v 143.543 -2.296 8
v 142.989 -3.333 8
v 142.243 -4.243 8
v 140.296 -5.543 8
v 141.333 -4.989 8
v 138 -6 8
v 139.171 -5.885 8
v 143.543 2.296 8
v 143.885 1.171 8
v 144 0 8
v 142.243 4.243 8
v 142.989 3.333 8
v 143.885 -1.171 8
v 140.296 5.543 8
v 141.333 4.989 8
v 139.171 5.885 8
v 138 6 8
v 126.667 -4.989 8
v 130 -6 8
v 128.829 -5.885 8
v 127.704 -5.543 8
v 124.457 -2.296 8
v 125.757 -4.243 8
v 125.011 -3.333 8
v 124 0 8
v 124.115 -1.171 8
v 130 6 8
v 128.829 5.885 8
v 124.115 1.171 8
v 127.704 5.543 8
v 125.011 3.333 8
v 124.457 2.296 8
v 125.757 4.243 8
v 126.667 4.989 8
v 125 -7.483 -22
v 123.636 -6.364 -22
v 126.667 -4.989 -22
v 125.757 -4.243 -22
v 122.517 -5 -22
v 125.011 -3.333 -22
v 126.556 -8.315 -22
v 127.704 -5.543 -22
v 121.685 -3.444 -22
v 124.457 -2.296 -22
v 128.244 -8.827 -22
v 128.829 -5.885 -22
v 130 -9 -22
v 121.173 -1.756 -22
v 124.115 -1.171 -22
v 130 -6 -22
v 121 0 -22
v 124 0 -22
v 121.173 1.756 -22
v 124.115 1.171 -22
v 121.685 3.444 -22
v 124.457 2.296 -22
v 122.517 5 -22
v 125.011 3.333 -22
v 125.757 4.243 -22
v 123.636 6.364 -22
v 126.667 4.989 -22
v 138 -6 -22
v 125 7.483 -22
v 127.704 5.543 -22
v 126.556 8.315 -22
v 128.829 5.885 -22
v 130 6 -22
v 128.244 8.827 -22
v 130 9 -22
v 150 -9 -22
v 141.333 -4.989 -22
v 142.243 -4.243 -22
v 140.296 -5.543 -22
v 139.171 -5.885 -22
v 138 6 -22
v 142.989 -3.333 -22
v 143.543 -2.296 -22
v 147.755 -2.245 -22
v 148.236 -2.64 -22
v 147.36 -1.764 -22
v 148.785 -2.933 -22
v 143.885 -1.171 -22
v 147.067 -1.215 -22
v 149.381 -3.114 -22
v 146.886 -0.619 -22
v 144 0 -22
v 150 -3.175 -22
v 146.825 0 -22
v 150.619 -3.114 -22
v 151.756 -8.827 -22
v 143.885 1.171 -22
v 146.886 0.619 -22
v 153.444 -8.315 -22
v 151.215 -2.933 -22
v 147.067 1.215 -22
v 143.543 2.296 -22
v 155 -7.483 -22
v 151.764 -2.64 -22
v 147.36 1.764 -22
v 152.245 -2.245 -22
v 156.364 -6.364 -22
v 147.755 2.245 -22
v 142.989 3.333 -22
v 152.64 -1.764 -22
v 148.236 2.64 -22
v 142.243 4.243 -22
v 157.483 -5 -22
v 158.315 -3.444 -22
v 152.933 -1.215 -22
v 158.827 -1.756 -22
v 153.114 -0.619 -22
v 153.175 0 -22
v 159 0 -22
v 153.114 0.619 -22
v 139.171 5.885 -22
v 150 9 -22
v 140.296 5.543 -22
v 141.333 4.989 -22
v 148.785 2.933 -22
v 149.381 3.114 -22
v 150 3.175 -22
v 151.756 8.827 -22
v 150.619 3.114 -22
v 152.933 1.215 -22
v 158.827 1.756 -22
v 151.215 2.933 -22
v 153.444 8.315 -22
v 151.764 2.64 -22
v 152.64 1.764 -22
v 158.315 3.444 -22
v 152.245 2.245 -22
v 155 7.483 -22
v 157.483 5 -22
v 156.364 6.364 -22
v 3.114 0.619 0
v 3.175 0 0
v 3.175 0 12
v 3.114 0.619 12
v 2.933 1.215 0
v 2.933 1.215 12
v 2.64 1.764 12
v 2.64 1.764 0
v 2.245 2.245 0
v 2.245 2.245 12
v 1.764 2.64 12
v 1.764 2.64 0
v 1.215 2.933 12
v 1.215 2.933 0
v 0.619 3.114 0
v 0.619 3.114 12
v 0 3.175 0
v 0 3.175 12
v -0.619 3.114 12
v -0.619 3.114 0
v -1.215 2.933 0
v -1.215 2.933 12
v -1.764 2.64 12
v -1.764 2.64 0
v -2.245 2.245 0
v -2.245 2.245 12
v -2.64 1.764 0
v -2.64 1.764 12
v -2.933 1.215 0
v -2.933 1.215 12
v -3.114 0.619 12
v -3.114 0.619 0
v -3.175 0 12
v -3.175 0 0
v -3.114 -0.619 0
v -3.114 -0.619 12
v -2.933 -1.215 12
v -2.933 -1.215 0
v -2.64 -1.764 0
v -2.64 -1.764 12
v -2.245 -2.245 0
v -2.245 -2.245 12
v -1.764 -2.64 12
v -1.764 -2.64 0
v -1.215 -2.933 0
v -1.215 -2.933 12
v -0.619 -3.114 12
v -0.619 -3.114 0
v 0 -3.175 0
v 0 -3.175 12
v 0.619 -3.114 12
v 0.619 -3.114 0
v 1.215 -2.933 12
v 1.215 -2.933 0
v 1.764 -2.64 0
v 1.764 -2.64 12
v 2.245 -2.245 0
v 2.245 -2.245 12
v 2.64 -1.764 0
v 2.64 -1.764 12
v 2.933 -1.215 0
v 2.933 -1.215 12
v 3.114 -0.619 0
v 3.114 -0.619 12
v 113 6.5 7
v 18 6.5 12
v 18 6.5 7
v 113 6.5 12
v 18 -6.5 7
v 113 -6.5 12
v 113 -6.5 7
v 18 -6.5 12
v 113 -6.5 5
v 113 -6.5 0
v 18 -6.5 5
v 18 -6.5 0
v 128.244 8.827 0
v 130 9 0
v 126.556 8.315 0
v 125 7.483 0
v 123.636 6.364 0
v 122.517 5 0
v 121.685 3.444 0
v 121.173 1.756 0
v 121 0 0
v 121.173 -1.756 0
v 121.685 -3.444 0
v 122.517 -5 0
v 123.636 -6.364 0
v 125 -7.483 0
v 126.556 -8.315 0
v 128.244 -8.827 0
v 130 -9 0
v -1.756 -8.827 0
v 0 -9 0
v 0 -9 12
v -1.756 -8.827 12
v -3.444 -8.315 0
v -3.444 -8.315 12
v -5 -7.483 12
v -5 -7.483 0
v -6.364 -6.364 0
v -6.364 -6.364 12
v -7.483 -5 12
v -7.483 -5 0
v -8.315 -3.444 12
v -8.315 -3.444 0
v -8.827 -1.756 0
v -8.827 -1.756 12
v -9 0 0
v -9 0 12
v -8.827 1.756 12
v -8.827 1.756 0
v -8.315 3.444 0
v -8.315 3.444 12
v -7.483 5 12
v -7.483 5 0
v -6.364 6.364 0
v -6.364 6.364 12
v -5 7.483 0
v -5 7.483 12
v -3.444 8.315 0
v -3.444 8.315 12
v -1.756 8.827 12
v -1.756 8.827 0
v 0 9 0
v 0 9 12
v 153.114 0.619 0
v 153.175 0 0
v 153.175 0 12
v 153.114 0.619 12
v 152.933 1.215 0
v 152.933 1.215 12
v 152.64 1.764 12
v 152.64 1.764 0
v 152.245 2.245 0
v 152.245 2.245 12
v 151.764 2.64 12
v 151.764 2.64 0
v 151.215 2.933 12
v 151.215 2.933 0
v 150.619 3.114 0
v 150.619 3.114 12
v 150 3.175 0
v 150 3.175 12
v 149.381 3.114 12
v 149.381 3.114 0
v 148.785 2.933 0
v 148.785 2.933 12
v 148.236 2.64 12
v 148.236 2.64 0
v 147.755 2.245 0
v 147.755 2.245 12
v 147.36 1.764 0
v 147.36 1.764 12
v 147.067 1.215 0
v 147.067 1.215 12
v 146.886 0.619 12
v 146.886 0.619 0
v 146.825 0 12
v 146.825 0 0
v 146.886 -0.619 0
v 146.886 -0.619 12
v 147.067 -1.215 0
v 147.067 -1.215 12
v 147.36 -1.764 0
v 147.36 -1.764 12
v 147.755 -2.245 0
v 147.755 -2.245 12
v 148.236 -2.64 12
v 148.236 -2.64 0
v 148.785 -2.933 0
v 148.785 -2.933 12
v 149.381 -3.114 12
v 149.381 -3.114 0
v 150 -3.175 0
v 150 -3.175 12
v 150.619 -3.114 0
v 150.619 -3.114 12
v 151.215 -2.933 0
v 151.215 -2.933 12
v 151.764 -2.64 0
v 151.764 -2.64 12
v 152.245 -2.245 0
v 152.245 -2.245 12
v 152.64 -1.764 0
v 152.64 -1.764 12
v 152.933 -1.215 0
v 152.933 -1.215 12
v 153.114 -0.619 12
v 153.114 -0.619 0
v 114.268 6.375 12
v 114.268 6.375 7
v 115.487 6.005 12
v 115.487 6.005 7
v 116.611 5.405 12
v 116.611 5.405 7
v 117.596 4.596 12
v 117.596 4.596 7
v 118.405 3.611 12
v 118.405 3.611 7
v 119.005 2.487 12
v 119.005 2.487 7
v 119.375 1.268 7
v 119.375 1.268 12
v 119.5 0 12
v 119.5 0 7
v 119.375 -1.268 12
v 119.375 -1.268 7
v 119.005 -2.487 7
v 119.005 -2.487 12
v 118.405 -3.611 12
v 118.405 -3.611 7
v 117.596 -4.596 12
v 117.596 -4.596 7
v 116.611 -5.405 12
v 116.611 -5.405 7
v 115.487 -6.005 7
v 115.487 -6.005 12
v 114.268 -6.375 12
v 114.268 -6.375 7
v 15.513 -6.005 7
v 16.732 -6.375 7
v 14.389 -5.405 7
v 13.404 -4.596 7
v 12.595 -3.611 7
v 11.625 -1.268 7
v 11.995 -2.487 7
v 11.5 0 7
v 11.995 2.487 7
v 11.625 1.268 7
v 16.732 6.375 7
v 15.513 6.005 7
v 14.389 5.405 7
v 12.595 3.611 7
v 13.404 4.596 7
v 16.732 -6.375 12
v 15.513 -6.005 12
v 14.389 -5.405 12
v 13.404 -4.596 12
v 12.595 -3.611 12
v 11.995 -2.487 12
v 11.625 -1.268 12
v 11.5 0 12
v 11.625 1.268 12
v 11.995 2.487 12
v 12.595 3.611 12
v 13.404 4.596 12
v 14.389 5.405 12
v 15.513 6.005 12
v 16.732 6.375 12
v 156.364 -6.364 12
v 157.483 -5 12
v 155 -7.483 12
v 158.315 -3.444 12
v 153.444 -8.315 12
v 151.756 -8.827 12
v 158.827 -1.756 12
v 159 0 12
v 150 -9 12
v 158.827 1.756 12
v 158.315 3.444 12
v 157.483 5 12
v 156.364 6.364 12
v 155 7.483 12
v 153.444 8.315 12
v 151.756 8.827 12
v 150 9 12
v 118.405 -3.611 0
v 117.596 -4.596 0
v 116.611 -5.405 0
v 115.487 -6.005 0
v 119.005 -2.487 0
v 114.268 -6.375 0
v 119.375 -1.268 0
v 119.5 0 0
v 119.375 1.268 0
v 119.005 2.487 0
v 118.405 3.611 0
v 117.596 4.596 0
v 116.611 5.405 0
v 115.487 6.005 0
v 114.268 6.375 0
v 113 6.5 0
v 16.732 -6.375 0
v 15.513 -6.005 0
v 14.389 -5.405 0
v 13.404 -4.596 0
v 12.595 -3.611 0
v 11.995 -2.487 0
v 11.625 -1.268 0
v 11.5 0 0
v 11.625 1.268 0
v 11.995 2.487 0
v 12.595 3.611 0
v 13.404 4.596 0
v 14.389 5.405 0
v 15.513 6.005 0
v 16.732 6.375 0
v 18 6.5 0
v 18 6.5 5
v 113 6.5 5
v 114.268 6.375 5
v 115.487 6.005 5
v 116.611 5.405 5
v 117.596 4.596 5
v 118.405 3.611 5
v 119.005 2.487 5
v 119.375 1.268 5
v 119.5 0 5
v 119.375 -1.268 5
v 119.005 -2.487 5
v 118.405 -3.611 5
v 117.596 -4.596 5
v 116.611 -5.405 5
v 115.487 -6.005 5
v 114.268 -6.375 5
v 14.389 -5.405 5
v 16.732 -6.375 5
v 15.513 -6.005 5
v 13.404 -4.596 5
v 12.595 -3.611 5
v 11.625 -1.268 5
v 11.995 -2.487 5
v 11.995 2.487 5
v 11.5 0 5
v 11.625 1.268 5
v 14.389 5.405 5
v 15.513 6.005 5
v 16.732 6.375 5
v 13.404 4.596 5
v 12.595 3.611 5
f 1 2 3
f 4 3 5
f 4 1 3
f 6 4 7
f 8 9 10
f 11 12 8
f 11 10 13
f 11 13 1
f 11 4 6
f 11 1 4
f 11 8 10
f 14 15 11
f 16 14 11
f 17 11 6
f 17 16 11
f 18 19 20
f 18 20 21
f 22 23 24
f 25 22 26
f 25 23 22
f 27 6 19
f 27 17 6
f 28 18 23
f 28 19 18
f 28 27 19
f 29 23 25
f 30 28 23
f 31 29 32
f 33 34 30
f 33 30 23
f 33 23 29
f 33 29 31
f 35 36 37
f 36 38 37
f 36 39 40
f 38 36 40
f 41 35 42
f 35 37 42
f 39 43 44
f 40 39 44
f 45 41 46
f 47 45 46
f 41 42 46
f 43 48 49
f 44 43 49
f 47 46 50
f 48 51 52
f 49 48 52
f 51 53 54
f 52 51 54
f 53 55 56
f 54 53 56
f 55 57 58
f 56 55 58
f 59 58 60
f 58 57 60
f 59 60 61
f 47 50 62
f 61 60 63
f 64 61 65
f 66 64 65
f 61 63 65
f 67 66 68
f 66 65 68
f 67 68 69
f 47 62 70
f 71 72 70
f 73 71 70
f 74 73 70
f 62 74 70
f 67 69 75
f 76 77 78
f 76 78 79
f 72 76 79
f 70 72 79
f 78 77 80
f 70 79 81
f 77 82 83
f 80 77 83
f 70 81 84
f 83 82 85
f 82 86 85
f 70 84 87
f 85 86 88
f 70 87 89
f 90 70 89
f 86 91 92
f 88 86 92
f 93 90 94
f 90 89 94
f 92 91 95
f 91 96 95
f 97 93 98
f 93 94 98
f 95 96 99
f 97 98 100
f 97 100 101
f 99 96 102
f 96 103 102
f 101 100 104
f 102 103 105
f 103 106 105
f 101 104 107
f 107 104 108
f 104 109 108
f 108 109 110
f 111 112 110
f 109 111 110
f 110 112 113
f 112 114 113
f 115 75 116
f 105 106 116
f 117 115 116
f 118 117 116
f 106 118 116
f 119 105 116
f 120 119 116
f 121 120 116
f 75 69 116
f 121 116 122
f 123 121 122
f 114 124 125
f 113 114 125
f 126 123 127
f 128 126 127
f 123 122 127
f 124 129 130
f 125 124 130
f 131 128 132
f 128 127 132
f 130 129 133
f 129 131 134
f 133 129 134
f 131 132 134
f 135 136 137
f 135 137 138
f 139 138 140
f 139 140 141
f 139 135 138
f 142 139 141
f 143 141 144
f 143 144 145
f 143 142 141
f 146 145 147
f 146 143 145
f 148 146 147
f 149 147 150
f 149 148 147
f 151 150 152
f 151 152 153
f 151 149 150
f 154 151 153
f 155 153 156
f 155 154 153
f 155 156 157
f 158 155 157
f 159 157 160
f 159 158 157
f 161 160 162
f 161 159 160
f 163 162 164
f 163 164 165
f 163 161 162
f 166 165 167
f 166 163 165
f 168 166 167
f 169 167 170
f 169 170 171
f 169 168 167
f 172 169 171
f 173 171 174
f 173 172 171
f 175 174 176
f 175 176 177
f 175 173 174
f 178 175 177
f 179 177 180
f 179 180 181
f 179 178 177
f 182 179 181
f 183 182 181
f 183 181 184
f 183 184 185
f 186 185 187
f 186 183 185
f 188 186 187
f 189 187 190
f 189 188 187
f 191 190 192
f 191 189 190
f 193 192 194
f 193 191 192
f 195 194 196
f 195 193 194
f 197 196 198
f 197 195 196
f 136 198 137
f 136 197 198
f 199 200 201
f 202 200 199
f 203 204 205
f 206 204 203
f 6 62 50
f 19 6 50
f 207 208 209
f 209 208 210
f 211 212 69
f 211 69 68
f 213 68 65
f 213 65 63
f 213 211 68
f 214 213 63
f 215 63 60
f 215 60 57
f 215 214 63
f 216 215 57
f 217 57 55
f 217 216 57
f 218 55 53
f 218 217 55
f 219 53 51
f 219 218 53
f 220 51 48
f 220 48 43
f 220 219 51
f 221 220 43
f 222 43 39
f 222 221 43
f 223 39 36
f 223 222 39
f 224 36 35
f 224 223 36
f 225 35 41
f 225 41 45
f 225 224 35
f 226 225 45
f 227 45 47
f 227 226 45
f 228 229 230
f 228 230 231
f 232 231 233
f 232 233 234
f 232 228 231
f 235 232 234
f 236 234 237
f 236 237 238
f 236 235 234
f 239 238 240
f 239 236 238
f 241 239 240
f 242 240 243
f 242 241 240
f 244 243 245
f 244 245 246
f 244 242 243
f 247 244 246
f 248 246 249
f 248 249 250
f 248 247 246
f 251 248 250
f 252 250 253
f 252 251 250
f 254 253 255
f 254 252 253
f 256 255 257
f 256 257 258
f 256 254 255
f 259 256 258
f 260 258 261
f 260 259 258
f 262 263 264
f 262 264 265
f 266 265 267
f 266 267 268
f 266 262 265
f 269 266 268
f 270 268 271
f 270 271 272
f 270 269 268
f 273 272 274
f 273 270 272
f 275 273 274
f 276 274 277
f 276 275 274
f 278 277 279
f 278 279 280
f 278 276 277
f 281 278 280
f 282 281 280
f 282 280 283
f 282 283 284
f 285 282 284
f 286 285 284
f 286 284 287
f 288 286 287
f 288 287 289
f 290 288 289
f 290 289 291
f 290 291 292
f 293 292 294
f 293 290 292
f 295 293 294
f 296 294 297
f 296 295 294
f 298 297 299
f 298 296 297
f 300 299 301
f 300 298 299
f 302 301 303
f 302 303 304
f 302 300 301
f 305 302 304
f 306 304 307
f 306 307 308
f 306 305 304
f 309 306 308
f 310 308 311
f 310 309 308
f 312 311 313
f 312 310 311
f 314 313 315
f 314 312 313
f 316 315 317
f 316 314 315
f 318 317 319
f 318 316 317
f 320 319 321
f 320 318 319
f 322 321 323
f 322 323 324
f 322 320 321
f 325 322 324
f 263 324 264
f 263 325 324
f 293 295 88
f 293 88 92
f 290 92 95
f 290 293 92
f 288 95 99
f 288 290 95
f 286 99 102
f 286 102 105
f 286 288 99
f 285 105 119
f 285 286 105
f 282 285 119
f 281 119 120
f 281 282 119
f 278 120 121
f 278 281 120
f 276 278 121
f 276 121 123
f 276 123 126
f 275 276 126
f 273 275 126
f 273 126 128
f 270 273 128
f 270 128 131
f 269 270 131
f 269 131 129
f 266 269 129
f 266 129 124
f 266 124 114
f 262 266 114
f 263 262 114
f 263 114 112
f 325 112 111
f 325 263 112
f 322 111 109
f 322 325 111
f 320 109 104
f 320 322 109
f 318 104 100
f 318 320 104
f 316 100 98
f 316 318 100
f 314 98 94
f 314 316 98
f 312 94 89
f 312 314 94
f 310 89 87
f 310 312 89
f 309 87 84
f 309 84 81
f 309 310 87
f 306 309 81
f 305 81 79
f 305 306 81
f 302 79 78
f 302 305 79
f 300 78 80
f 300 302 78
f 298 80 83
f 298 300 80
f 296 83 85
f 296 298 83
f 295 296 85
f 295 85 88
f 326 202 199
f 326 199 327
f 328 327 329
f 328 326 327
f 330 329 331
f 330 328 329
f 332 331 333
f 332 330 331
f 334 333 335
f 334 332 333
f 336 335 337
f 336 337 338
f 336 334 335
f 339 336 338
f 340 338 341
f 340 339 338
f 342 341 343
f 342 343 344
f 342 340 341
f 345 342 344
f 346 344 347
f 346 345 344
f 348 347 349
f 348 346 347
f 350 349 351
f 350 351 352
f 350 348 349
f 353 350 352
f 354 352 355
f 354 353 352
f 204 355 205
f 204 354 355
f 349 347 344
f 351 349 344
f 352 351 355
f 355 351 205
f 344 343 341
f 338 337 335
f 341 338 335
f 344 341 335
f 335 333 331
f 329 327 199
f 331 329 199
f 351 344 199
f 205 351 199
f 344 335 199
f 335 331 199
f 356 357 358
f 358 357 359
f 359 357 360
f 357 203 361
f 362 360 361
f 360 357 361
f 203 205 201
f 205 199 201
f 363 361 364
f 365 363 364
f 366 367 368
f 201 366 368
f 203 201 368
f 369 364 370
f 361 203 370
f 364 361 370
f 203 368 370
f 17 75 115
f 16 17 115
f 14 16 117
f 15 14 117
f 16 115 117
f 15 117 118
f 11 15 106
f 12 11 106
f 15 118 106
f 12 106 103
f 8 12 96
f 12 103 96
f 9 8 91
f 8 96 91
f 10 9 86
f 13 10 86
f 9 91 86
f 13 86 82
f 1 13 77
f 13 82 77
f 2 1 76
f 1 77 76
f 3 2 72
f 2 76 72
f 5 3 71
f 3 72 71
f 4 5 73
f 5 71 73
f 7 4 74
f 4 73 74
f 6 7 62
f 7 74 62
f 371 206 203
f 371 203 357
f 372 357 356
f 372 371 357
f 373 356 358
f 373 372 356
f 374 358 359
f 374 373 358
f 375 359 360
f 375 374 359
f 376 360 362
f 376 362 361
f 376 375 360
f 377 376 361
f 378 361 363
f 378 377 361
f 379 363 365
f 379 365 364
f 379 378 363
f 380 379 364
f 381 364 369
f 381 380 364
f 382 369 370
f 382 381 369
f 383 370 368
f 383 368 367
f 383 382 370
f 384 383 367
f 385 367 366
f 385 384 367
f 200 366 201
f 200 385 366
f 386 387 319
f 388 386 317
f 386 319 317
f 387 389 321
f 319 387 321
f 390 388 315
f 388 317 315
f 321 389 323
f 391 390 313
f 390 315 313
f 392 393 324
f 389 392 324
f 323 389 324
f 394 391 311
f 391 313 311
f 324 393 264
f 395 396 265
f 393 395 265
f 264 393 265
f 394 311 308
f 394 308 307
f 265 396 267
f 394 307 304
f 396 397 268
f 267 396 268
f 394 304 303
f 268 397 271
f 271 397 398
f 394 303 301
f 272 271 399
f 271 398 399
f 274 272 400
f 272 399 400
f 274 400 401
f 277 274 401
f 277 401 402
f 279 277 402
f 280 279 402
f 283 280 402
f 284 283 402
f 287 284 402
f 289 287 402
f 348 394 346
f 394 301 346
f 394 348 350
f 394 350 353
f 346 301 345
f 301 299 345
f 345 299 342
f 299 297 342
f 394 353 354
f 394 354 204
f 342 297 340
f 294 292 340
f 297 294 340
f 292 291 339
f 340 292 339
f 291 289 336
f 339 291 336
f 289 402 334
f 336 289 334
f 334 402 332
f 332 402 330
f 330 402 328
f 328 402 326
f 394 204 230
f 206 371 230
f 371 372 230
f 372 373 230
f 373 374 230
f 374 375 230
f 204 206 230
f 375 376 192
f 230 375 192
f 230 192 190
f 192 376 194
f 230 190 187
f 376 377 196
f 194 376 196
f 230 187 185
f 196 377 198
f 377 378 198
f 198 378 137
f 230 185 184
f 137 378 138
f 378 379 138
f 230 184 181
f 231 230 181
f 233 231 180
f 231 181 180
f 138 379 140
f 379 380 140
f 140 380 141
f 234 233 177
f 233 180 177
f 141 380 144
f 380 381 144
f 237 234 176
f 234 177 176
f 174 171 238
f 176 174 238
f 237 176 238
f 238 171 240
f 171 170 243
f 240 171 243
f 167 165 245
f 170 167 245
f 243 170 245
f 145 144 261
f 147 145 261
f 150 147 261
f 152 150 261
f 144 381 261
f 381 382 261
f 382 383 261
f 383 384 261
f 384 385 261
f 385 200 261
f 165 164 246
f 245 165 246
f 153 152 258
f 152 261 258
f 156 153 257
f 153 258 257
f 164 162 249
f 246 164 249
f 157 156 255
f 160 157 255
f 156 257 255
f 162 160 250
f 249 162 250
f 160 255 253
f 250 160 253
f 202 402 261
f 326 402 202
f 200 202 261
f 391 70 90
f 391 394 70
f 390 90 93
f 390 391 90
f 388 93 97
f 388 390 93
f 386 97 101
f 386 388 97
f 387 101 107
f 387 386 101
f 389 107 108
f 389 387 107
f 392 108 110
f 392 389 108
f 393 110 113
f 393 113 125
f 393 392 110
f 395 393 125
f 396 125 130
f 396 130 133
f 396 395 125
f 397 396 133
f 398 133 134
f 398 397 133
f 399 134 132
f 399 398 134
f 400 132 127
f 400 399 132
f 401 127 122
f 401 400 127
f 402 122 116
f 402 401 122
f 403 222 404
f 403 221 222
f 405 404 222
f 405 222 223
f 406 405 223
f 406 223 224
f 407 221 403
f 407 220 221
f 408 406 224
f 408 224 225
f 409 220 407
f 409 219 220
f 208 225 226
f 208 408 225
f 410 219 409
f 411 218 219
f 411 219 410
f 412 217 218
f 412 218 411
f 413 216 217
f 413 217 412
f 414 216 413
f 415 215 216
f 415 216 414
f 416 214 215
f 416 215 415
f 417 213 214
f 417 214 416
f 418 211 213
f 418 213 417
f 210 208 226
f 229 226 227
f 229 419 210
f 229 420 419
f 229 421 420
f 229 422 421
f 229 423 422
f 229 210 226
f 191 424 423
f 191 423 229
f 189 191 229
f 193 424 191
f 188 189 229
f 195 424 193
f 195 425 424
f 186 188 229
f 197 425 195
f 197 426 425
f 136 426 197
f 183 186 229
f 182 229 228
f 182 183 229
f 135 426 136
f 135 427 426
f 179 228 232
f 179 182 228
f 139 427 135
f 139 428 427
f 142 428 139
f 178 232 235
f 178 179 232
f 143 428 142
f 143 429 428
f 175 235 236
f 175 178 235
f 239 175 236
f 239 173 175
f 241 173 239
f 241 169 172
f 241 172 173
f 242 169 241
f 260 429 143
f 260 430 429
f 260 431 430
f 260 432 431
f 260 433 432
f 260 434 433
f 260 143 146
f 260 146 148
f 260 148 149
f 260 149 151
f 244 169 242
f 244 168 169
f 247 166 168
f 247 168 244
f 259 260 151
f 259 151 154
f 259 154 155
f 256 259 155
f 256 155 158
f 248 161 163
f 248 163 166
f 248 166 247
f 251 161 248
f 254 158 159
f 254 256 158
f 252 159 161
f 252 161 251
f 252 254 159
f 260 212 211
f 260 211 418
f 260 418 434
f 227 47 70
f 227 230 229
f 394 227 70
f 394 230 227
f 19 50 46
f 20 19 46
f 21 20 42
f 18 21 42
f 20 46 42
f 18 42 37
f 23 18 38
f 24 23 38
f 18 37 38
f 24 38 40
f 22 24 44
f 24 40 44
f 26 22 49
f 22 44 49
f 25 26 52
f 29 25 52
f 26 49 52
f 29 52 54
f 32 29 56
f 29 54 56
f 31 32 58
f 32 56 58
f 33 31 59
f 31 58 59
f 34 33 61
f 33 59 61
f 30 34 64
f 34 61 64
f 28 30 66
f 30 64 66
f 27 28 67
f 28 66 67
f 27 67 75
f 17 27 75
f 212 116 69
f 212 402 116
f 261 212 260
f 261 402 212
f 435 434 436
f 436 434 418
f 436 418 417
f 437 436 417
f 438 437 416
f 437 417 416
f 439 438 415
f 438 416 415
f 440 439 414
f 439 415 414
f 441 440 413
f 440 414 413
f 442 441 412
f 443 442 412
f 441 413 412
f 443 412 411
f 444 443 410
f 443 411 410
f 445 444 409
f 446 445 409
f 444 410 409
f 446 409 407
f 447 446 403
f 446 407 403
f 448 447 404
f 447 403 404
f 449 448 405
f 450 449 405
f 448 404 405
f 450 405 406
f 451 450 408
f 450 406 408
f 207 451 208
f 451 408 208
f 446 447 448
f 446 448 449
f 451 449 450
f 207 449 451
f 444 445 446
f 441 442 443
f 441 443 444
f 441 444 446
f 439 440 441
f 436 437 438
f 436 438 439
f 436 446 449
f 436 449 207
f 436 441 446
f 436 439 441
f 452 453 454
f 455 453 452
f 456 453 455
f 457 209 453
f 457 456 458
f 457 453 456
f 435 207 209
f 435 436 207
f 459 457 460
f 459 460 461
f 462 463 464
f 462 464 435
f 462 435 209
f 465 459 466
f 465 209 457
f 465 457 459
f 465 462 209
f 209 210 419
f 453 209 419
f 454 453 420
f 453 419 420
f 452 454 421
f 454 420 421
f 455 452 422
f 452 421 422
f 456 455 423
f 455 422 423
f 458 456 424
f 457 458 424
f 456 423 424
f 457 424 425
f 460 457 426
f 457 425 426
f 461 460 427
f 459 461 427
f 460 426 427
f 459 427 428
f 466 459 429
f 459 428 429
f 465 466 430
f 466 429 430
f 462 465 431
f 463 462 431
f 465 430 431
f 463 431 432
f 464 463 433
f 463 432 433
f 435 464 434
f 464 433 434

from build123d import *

# Parameters (mm, degrees)
SKETCH1_R           = 3.175
BOSS_EXTRUDE1_DEPTH = 12
SKETCH2_R           = 3.175
BOSS_EXTRUDE2_DEPTH = 22
CUT_EXTRUDE1_DEPTH  = 5
CUT_EXTRUDE2_DEPTH  = 30


with BuildPart() as part:
    # Sketch1 → Boss-Extrude1 (new body)
    with BuildSketch(Plane.XY):
        with BuildLine():
            Line((0, 9), (150, 9))
            ThreePointArc((150, 9), (159, 0), (150, -9))
            Line((150, -9), (0, -9))
            ThreePointArc((0, -9), (-9, 0), (0, 9))
        make_face()
        Circle(SKETCH1_R, mode=Mode.SUBTRACT)
        with Locations((150, 0)):
            Circle(SKETCH1_R, mode=Mode.SUBTRACT)
    extrude(amount=BOSS_EXTRUDE1_DEPTH)

    # Sketch2 → Boss-Extrude2 (add)
    with BuildSketch(Plane(origin=(0, 0, 0), x_dir=(-1, 0, 0), z_dir=(0, 0, -1))):
        with BuildLine():
            Line((-150, 9), (-130, 9))
            ThreePointArc((-130, 9), (-121, 0), (-130, -9))
            Line((-130, -9), (-150, -9))
            ThreePointArc((-150, -9), (-159, 0), (-150, 9))
        make_face()
        with Locations((-150, 0)):
            Circle(SKETCH2_R, mode=Mode.SUBTRACT)
    extrude(amount=BOSS_EXTRUDE2_DEPTH)

    # Sketch3 → Cut-Extrude1 (cut)
    with BuildSketch(Plane.XY.offset(12)):
        with BuildLine():
            Line((18, 6.5), (113, 6.5))
            ThreePointArc((113, 6.5), (119.5, 0), (113, -6.5))
            Line((113, -6.5), (18, -6.5))
            ThreePointArc((18, -6.5), (11.5, 0), (18, 6.5))
        make_face()
    cut_extrude1 = extrude(amount=-CUT_EXTRUDE1_DEPTH, mode=Mode.SUBTRACT)

    # Mirror1: Cut-Extrude1 across plane
    add(cut_extrude1.mirror(Plane.XY.offset(6)), mode=Mode.SUBTRACT)

    # Sketch4 → Cut-Extrude2 (cut)
    with BuildSketch(Plane(origin=(0, 0, -22), x_dir=(-1, 0, 0), z_dir=(0, 0, -1))):
        with BuildLine():
            Line((-130, 6), (-138, 6))
            ThreePointArc((-138, 6), (-144, 0), (-138, -6))
            Line((-138, -6), (-130, -6))
            ThreePointArc((-130, -6), (-124, 0), (-130, 6))
        make_face()
    extrude(amount=-CUT_EXTRUDE2_DEPTH, mode=Mode.SUBTRACT)


solid = part.part
